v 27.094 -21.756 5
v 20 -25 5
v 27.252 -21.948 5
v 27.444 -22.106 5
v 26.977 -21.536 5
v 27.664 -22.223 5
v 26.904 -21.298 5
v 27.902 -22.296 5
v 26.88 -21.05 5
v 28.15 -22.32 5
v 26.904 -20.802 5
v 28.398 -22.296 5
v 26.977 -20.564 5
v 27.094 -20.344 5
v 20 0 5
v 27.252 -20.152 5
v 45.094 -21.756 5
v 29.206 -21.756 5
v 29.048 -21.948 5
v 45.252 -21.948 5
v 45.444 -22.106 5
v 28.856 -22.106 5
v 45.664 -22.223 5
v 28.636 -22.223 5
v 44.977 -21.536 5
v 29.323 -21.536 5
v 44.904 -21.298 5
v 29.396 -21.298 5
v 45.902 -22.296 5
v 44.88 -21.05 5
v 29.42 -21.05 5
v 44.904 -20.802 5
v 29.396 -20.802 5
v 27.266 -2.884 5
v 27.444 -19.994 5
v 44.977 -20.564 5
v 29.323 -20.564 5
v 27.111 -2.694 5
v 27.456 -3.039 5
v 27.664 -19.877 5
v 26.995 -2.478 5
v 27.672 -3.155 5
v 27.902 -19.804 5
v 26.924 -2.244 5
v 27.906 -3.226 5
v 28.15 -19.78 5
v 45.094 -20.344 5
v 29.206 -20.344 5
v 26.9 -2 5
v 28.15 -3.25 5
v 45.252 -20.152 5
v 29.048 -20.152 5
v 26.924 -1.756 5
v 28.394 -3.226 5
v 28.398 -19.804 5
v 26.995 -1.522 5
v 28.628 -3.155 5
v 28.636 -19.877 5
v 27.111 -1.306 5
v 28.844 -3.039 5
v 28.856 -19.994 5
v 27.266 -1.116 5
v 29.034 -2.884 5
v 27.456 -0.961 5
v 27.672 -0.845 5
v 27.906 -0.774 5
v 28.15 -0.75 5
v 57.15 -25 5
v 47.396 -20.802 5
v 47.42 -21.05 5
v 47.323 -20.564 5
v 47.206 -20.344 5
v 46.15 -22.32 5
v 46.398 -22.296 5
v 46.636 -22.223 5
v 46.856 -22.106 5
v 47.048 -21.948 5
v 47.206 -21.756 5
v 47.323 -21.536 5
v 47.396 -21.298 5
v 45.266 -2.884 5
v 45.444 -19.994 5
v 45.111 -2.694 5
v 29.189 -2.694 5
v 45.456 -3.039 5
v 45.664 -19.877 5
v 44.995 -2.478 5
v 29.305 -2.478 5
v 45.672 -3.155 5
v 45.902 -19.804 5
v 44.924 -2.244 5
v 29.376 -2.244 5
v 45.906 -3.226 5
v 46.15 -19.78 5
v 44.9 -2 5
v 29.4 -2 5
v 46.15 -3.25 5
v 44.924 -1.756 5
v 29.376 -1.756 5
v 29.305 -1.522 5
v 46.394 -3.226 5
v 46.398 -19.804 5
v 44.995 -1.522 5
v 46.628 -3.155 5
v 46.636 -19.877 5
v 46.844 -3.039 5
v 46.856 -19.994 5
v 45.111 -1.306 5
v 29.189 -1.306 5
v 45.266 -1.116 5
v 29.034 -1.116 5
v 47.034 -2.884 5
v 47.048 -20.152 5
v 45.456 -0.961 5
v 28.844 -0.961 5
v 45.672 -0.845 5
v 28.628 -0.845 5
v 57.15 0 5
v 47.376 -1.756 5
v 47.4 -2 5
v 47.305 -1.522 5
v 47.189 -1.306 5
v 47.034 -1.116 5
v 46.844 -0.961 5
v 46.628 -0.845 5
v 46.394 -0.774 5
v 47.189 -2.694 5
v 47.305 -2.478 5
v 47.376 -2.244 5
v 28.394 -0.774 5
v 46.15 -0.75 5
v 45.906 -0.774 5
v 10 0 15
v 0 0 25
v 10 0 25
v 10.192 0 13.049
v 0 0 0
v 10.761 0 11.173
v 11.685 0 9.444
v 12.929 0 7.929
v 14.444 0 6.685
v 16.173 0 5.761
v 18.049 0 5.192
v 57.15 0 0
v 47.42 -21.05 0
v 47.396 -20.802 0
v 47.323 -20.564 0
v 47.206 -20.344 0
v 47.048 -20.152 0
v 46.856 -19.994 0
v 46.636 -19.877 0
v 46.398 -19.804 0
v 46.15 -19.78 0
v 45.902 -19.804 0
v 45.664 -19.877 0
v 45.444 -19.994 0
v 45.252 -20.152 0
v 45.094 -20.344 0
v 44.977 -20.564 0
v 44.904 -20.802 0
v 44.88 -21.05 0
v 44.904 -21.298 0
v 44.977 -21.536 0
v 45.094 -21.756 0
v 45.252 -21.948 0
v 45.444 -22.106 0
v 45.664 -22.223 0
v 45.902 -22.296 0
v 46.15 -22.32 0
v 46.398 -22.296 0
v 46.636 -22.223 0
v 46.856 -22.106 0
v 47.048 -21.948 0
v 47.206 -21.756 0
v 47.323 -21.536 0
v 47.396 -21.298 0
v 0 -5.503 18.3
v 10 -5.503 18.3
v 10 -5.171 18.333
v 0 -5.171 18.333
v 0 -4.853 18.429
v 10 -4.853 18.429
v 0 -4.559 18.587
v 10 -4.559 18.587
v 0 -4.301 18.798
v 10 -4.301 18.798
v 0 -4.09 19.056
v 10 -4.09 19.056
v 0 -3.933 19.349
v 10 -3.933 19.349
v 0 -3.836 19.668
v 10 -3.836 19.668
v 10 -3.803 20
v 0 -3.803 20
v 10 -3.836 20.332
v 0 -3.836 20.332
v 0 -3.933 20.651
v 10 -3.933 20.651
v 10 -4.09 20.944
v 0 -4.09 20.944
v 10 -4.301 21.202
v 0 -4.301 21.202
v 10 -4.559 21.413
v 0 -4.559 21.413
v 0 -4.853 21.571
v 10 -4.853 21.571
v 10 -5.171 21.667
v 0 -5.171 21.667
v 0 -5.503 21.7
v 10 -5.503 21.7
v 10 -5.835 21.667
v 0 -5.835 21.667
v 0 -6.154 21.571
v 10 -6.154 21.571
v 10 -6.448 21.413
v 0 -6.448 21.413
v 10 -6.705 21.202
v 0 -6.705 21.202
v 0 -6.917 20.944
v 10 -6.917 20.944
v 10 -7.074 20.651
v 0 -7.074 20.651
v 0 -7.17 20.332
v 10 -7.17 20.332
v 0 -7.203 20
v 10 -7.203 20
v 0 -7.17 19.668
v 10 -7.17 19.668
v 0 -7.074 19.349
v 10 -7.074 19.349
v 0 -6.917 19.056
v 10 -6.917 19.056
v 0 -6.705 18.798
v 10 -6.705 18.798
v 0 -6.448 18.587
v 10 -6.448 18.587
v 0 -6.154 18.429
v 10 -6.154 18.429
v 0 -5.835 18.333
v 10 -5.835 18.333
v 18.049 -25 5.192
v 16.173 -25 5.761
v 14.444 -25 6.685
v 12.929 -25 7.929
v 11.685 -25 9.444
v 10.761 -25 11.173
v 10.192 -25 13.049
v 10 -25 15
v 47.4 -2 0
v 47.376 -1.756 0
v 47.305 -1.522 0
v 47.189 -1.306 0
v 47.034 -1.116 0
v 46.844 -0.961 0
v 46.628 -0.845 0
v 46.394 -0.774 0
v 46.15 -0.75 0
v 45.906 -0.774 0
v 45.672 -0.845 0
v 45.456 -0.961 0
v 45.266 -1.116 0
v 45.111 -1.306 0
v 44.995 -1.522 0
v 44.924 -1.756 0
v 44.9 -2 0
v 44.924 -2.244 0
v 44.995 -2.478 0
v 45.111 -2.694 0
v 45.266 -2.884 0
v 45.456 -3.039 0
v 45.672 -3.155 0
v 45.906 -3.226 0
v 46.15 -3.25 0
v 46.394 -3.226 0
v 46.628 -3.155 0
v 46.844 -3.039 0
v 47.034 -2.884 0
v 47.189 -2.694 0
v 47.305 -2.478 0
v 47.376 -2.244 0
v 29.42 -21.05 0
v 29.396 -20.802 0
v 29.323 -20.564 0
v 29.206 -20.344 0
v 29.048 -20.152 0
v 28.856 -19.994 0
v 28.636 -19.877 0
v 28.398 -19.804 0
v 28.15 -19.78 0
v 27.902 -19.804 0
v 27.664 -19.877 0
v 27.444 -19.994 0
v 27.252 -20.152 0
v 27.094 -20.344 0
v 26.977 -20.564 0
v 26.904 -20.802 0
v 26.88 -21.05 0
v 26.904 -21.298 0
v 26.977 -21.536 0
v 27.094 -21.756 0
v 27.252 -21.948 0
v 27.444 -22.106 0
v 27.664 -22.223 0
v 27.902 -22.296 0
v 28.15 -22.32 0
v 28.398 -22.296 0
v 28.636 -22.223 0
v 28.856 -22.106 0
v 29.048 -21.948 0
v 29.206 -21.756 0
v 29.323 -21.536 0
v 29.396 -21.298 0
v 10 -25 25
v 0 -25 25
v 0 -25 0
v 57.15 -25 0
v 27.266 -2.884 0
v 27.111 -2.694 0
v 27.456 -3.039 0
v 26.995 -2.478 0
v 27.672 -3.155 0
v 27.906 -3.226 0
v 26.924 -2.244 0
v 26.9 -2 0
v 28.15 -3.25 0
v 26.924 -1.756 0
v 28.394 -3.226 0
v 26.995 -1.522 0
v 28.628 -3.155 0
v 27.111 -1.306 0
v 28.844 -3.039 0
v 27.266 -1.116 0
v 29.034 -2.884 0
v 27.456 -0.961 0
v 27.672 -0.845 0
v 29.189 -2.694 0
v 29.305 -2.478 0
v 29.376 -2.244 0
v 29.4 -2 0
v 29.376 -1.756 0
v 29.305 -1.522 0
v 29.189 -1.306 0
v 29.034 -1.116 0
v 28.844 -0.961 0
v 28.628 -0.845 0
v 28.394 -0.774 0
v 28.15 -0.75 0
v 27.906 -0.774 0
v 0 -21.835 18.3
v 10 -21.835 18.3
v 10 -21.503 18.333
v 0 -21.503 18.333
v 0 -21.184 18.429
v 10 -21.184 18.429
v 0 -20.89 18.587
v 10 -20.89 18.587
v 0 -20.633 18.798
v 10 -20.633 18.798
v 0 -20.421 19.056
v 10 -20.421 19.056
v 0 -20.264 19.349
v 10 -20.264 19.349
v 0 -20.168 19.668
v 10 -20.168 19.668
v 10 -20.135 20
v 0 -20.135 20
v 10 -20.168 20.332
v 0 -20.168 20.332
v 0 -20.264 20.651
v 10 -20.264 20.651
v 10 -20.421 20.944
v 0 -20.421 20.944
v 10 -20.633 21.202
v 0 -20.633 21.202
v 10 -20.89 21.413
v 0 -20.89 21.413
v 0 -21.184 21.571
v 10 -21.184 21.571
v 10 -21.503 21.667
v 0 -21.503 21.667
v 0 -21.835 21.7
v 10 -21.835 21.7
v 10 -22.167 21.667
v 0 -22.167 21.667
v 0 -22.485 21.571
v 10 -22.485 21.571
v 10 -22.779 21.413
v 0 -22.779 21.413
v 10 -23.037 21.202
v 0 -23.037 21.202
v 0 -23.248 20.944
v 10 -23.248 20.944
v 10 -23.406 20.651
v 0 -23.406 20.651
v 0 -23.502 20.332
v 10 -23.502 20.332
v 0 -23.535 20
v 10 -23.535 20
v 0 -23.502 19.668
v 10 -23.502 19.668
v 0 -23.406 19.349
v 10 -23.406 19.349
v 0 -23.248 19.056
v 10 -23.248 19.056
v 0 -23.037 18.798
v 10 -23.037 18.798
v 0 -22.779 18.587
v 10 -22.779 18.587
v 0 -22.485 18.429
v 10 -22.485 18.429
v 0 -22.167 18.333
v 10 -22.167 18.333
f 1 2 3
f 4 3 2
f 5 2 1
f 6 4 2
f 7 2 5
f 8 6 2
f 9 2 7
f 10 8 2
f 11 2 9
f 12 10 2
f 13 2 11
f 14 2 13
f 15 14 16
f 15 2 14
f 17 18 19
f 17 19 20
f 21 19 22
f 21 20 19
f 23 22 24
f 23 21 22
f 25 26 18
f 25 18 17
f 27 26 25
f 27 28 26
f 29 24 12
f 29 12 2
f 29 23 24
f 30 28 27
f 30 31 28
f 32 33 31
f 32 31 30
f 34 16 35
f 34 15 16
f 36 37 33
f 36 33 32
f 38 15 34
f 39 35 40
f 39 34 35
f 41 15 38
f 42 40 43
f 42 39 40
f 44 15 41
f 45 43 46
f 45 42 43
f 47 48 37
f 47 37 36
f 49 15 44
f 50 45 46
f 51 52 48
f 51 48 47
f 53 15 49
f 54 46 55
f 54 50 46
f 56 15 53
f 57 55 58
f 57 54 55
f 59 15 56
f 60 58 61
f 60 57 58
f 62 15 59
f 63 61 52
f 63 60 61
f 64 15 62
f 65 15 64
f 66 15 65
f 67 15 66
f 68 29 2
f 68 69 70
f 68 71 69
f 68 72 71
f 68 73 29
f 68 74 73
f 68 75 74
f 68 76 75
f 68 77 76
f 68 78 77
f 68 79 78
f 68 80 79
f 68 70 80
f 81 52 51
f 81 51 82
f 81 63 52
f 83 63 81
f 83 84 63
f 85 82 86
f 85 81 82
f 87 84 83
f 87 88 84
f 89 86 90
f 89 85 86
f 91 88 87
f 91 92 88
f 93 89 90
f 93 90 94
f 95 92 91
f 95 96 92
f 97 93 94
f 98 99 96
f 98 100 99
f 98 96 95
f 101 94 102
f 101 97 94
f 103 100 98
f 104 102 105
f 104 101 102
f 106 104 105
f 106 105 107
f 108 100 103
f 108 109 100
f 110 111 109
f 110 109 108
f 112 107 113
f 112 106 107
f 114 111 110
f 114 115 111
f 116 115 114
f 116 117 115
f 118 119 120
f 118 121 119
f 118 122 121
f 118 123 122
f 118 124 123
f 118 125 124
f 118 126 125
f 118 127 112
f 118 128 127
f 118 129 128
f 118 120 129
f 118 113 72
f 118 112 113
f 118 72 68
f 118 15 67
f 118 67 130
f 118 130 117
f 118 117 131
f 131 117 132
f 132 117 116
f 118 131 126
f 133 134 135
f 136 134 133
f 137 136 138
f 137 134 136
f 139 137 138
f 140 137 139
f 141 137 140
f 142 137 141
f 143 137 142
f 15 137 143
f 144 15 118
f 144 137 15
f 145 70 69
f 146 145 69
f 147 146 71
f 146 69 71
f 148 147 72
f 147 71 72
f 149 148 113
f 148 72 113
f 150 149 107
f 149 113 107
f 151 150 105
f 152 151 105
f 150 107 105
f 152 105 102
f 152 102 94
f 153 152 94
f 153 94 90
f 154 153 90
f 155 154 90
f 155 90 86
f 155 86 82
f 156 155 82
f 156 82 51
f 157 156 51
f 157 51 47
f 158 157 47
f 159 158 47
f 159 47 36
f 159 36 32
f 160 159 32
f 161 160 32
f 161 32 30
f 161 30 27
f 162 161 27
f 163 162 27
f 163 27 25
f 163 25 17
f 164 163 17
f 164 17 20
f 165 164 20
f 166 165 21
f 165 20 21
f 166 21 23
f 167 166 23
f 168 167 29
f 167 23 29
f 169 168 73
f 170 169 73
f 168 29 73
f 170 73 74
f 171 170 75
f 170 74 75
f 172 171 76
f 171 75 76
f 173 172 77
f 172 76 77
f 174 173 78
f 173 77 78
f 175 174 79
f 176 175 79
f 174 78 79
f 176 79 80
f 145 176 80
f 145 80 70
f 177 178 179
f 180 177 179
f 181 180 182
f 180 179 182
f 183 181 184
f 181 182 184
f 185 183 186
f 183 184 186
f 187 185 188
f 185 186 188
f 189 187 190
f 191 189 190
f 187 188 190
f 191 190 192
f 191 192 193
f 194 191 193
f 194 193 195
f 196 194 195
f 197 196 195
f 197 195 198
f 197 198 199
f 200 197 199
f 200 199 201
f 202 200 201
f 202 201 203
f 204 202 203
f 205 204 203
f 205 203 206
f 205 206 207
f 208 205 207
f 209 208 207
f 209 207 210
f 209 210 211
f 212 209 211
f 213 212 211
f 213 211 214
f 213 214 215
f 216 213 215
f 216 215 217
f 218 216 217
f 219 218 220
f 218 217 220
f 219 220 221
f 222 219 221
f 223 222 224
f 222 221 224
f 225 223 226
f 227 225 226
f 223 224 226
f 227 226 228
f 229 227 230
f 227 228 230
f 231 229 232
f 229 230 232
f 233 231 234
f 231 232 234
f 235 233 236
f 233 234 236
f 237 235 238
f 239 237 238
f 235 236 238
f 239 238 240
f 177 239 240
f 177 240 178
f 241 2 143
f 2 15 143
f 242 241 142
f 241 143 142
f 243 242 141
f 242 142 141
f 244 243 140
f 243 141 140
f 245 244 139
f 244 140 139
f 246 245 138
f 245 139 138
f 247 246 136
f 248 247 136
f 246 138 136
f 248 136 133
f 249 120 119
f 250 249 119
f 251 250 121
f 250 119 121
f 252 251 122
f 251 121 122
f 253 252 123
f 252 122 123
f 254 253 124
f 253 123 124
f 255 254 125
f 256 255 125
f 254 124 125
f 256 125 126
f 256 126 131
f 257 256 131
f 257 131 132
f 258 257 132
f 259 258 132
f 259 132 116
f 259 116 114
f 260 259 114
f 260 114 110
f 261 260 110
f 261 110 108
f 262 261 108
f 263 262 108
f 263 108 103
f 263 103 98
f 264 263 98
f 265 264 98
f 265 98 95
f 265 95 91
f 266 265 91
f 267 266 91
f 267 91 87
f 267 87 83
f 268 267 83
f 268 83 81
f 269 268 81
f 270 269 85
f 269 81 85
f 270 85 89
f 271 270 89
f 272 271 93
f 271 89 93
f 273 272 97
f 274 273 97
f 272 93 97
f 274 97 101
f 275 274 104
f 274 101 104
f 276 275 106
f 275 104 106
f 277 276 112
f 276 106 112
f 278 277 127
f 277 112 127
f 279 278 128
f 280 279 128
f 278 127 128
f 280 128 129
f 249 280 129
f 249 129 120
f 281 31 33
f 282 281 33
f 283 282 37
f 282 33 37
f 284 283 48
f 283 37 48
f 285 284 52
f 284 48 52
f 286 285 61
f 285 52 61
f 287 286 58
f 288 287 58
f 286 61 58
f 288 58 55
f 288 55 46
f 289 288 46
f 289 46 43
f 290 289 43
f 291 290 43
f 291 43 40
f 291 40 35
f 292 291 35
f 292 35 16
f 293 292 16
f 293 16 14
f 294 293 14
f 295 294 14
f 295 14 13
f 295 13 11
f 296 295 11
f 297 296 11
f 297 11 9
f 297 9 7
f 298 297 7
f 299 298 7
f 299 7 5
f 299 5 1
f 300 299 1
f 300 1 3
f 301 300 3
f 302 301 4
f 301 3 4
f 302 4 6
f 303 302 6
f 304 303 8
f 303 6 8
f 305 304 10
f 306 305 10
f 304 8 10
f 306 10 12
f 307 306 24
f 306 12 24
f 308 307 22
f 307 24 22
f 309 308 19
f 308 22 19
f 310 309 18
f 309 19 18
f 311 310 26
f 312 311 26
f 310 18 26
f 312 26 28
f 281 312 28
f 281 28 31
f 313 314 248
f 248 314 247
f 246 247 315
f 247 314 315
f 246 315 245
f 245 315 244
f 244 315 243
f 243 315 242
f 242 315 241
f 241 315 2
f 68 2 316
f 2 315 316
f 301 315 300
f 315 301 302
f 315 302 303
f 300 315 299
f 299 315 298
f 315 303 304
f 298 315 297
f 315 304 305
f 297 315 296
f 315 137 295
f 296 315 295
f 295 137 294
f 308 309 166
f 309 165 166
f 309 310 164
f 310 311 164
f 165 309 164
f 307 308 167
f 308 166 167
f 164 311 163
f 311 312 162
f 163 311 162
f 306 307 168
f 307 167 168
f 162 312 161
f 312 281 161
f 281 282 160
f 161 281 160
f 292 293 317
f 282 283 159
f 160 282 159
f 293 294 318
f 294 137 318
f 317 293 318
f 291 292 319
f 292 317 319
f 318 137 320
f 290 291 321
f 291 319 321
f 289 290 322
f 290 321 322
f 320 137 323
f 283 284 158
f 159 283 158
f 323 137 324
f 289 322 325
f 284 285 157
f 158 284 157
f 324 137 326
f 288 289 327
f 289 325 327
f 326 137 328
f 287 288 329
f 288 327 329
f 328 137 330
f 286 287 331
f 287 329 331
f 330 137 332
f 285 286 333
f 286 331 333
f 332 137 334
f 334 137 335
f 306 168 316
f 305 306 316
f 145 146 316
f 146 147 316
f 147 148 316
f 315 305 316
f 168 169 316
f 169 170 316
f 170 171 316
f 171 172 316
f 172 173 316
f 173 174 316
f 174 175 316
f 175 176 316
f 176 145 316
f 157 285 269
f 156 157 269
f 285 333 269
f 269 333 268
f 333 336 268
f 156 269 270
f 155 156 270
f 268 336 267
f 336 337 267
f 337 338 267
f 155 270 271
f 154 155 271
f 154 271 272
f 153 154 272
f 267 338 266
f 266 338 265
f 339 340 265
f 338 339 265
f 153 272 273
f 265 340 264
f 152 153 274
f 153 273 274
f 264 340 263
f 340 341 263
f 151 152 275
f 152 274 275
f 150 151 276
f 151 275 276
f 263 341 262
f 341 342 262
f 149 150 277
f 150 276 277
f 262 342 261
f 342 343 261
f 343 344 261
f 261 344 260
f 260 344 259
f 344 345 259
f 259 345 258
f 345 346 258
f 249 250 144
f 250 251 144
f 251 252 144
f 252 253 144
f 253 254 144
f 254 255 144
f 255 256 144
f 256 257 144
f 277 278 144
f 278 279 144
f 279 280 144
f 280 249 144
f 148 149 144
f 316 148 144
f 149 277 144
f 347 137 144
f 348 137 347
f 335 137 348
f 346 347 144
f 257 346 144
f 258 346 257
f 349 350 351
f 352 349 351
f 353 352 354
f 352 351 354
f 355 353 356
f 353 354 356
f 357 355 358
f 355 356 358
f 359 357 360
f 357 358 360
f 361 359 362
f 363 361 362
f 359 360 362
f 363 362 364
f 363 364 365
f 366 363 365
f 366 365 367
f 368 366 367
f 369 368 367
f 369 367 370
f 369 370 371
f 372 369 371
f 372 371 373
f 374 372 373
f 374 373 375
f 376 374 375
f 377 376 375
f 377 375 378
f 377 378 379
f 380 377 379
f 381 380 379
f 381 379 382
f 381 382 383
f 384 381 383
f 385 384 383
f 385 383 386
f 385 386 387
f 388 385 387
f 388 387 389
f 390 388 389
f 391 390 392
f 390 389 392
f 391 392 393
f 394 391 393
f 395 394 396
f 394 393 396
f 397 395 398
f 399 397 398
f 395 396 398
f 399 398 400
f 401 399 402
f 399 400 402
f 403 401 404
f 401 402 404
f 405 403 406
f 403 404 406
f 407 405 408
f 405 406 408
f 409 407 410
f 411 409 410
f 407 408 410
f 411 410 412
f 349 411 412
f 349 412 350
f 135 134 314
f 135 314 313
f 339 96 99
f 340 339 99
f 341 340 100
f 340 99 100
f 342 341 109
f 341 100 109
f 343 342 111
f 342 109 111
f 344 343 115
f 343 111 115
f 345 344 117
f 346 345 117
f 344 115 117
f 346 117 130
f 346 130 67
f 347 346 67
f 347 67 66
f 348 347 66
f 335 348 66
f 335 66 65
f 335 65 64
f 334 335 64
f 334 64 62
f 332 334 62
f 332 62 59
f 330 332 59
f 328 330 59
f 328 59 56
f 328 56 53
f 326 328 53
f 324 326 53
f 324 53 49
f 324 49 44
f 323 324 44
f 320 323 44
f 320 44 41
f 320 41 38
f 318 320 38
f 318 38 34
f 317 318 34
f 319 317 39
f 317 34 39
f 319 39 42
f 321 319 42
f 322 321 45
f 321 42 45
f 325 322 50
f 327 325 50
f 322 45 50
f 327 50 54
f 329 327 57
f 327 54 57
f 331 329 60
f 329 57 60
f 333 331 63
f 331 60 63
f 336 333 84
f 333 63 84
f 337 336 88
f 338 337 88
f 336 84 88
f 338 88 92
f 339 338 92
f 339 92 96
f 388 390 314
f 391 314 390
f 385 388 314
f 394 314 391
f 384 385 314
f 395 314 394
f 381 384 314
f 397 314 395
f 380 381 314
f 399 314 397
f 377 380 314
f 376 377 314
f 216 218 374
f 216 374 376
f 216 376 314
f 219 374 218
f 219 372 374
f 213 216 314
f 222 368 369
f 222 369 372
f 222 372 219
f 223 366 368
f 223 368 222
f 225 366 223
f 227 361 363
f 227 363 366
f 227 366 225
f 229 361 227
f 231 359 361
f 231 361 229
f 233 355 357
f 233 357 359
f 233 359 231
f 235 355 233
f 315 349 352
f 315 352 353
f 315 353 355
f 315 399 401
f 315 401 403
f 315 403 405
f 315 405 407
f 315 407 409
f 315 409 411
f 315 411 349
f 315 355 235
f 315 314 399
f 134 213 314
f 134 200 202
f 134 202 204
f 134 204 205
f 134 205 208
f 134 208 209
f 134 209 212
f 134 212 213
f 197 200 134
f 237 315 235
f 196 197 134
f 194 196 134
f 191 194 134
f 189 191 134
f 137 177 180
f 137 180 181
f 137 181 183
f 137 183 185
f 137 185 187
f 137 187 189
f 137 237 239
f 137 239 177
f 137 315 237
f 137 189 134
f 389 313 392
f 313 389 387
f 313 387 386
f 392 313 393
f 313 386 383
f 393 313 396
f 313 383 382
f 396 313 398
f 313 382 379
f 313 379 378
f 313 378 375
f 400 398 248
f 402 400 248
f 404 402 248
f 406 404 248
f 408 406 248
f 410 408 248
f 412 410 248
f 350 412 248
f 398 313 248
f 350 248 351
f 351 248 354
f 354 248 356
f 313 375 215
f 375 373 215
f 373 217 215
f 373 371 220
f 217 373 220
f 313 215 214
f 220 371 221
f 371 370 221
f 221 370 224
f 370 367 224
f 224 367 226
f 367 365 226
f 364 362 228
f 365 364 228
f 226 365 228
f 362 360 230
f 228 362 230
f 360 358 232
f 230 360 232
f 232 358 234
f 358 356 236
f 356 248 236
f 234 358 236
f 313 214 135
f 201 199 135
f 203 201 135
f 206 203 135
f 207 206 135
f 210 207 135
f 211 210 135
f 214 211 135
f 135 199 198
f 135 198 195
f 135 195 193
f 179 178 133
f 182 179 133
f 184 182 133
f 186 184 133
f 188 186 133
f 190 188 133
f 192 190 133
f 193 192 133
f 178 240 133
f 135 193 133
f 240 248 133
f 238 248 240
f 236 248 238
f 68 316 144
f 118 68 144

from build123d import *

# Parameters (mm, degrees)
SKETCH1_W           = 57.15
SKETCH1_H           = 25
BOSS_EXTRUDE1_DEPTH = 5
SKETCH2_R           = 1.25
SKETCH2_R_2         = 1.27
CUT_EXTRUDE2_DEPTH  = 6
SKETCH5_W           = 10
SKETCH5_H           = 25
BOSS_EXTRUDE3_DEPTH = 20
FILLET1_R           = 10
SKETCH6_R           = 1.7
CUT_EXTRUDE3_DEPTH  = 11


with BuildPart() as part:
    # Sketch1 → Boss-Extrude1 (new body)
    with BuildSketch(Plane.XY):
        with Locations((28.575, -12.5)):
            Rectangle(SKETCH1_W, SKETCH1_H)
    extrude(amount=BOSS_EXTRUDE1_DEPTH)

    # Sketch2 → Cut-Extrude2 (cut, through all)
    with BuildSketch(Plane.XY.offset(5)):
        with Locations((28.15, -2)):
            Circle(SKETCH2_R)
        with Locations((46.15, -2)):
            Circle(SKETCH2_R)
        with Locations((28.15, -21.05)):
            Circle(SKETCH2_R_2)
        with Locations((46.15, -21.05)):
            Circle(SKETCH2_R_2)
    extrude(amount=-CUT_EXTRUDE2_DEPTH, mode=Mode.SUBTRACT)

    # Sketch5 → Boss-Extrude3 (add)
    with BuildSketch(Plane.XY.offset(5)):
        with Locations((5, -12.5)):
            Rectangle(SKETCH5_W, SKETCH5_H)
    extrude(amount=BOSS_EXTRUDE3_DEPTH)

    # Fillet1
    fillet1_edges = [part.edges().sort_by_distance(p)[0] for p in [
        (10, -12.5, 5),
    ]]
    fillet(fillet1_edges, radius=FILLET1_R)

    # Sketch6 → Cut-Extrude3 (cut, through all)
    with BuildSketch(Plane(origin=(10, 0, 0), x_dir=(0, 0, -1), z_dir=(1, 0, 0))):
        with Locations((-20, -21.834919238)):
            Circle(SKETCH6_R)
        with Locations((-20, -5.503108416)):
            Circle(SKETCH6_R)
    extrude(amount=-CUT_EXTRUDE3_DEPTH, mode=Mode.SUBTRACT)


solid = part.part
